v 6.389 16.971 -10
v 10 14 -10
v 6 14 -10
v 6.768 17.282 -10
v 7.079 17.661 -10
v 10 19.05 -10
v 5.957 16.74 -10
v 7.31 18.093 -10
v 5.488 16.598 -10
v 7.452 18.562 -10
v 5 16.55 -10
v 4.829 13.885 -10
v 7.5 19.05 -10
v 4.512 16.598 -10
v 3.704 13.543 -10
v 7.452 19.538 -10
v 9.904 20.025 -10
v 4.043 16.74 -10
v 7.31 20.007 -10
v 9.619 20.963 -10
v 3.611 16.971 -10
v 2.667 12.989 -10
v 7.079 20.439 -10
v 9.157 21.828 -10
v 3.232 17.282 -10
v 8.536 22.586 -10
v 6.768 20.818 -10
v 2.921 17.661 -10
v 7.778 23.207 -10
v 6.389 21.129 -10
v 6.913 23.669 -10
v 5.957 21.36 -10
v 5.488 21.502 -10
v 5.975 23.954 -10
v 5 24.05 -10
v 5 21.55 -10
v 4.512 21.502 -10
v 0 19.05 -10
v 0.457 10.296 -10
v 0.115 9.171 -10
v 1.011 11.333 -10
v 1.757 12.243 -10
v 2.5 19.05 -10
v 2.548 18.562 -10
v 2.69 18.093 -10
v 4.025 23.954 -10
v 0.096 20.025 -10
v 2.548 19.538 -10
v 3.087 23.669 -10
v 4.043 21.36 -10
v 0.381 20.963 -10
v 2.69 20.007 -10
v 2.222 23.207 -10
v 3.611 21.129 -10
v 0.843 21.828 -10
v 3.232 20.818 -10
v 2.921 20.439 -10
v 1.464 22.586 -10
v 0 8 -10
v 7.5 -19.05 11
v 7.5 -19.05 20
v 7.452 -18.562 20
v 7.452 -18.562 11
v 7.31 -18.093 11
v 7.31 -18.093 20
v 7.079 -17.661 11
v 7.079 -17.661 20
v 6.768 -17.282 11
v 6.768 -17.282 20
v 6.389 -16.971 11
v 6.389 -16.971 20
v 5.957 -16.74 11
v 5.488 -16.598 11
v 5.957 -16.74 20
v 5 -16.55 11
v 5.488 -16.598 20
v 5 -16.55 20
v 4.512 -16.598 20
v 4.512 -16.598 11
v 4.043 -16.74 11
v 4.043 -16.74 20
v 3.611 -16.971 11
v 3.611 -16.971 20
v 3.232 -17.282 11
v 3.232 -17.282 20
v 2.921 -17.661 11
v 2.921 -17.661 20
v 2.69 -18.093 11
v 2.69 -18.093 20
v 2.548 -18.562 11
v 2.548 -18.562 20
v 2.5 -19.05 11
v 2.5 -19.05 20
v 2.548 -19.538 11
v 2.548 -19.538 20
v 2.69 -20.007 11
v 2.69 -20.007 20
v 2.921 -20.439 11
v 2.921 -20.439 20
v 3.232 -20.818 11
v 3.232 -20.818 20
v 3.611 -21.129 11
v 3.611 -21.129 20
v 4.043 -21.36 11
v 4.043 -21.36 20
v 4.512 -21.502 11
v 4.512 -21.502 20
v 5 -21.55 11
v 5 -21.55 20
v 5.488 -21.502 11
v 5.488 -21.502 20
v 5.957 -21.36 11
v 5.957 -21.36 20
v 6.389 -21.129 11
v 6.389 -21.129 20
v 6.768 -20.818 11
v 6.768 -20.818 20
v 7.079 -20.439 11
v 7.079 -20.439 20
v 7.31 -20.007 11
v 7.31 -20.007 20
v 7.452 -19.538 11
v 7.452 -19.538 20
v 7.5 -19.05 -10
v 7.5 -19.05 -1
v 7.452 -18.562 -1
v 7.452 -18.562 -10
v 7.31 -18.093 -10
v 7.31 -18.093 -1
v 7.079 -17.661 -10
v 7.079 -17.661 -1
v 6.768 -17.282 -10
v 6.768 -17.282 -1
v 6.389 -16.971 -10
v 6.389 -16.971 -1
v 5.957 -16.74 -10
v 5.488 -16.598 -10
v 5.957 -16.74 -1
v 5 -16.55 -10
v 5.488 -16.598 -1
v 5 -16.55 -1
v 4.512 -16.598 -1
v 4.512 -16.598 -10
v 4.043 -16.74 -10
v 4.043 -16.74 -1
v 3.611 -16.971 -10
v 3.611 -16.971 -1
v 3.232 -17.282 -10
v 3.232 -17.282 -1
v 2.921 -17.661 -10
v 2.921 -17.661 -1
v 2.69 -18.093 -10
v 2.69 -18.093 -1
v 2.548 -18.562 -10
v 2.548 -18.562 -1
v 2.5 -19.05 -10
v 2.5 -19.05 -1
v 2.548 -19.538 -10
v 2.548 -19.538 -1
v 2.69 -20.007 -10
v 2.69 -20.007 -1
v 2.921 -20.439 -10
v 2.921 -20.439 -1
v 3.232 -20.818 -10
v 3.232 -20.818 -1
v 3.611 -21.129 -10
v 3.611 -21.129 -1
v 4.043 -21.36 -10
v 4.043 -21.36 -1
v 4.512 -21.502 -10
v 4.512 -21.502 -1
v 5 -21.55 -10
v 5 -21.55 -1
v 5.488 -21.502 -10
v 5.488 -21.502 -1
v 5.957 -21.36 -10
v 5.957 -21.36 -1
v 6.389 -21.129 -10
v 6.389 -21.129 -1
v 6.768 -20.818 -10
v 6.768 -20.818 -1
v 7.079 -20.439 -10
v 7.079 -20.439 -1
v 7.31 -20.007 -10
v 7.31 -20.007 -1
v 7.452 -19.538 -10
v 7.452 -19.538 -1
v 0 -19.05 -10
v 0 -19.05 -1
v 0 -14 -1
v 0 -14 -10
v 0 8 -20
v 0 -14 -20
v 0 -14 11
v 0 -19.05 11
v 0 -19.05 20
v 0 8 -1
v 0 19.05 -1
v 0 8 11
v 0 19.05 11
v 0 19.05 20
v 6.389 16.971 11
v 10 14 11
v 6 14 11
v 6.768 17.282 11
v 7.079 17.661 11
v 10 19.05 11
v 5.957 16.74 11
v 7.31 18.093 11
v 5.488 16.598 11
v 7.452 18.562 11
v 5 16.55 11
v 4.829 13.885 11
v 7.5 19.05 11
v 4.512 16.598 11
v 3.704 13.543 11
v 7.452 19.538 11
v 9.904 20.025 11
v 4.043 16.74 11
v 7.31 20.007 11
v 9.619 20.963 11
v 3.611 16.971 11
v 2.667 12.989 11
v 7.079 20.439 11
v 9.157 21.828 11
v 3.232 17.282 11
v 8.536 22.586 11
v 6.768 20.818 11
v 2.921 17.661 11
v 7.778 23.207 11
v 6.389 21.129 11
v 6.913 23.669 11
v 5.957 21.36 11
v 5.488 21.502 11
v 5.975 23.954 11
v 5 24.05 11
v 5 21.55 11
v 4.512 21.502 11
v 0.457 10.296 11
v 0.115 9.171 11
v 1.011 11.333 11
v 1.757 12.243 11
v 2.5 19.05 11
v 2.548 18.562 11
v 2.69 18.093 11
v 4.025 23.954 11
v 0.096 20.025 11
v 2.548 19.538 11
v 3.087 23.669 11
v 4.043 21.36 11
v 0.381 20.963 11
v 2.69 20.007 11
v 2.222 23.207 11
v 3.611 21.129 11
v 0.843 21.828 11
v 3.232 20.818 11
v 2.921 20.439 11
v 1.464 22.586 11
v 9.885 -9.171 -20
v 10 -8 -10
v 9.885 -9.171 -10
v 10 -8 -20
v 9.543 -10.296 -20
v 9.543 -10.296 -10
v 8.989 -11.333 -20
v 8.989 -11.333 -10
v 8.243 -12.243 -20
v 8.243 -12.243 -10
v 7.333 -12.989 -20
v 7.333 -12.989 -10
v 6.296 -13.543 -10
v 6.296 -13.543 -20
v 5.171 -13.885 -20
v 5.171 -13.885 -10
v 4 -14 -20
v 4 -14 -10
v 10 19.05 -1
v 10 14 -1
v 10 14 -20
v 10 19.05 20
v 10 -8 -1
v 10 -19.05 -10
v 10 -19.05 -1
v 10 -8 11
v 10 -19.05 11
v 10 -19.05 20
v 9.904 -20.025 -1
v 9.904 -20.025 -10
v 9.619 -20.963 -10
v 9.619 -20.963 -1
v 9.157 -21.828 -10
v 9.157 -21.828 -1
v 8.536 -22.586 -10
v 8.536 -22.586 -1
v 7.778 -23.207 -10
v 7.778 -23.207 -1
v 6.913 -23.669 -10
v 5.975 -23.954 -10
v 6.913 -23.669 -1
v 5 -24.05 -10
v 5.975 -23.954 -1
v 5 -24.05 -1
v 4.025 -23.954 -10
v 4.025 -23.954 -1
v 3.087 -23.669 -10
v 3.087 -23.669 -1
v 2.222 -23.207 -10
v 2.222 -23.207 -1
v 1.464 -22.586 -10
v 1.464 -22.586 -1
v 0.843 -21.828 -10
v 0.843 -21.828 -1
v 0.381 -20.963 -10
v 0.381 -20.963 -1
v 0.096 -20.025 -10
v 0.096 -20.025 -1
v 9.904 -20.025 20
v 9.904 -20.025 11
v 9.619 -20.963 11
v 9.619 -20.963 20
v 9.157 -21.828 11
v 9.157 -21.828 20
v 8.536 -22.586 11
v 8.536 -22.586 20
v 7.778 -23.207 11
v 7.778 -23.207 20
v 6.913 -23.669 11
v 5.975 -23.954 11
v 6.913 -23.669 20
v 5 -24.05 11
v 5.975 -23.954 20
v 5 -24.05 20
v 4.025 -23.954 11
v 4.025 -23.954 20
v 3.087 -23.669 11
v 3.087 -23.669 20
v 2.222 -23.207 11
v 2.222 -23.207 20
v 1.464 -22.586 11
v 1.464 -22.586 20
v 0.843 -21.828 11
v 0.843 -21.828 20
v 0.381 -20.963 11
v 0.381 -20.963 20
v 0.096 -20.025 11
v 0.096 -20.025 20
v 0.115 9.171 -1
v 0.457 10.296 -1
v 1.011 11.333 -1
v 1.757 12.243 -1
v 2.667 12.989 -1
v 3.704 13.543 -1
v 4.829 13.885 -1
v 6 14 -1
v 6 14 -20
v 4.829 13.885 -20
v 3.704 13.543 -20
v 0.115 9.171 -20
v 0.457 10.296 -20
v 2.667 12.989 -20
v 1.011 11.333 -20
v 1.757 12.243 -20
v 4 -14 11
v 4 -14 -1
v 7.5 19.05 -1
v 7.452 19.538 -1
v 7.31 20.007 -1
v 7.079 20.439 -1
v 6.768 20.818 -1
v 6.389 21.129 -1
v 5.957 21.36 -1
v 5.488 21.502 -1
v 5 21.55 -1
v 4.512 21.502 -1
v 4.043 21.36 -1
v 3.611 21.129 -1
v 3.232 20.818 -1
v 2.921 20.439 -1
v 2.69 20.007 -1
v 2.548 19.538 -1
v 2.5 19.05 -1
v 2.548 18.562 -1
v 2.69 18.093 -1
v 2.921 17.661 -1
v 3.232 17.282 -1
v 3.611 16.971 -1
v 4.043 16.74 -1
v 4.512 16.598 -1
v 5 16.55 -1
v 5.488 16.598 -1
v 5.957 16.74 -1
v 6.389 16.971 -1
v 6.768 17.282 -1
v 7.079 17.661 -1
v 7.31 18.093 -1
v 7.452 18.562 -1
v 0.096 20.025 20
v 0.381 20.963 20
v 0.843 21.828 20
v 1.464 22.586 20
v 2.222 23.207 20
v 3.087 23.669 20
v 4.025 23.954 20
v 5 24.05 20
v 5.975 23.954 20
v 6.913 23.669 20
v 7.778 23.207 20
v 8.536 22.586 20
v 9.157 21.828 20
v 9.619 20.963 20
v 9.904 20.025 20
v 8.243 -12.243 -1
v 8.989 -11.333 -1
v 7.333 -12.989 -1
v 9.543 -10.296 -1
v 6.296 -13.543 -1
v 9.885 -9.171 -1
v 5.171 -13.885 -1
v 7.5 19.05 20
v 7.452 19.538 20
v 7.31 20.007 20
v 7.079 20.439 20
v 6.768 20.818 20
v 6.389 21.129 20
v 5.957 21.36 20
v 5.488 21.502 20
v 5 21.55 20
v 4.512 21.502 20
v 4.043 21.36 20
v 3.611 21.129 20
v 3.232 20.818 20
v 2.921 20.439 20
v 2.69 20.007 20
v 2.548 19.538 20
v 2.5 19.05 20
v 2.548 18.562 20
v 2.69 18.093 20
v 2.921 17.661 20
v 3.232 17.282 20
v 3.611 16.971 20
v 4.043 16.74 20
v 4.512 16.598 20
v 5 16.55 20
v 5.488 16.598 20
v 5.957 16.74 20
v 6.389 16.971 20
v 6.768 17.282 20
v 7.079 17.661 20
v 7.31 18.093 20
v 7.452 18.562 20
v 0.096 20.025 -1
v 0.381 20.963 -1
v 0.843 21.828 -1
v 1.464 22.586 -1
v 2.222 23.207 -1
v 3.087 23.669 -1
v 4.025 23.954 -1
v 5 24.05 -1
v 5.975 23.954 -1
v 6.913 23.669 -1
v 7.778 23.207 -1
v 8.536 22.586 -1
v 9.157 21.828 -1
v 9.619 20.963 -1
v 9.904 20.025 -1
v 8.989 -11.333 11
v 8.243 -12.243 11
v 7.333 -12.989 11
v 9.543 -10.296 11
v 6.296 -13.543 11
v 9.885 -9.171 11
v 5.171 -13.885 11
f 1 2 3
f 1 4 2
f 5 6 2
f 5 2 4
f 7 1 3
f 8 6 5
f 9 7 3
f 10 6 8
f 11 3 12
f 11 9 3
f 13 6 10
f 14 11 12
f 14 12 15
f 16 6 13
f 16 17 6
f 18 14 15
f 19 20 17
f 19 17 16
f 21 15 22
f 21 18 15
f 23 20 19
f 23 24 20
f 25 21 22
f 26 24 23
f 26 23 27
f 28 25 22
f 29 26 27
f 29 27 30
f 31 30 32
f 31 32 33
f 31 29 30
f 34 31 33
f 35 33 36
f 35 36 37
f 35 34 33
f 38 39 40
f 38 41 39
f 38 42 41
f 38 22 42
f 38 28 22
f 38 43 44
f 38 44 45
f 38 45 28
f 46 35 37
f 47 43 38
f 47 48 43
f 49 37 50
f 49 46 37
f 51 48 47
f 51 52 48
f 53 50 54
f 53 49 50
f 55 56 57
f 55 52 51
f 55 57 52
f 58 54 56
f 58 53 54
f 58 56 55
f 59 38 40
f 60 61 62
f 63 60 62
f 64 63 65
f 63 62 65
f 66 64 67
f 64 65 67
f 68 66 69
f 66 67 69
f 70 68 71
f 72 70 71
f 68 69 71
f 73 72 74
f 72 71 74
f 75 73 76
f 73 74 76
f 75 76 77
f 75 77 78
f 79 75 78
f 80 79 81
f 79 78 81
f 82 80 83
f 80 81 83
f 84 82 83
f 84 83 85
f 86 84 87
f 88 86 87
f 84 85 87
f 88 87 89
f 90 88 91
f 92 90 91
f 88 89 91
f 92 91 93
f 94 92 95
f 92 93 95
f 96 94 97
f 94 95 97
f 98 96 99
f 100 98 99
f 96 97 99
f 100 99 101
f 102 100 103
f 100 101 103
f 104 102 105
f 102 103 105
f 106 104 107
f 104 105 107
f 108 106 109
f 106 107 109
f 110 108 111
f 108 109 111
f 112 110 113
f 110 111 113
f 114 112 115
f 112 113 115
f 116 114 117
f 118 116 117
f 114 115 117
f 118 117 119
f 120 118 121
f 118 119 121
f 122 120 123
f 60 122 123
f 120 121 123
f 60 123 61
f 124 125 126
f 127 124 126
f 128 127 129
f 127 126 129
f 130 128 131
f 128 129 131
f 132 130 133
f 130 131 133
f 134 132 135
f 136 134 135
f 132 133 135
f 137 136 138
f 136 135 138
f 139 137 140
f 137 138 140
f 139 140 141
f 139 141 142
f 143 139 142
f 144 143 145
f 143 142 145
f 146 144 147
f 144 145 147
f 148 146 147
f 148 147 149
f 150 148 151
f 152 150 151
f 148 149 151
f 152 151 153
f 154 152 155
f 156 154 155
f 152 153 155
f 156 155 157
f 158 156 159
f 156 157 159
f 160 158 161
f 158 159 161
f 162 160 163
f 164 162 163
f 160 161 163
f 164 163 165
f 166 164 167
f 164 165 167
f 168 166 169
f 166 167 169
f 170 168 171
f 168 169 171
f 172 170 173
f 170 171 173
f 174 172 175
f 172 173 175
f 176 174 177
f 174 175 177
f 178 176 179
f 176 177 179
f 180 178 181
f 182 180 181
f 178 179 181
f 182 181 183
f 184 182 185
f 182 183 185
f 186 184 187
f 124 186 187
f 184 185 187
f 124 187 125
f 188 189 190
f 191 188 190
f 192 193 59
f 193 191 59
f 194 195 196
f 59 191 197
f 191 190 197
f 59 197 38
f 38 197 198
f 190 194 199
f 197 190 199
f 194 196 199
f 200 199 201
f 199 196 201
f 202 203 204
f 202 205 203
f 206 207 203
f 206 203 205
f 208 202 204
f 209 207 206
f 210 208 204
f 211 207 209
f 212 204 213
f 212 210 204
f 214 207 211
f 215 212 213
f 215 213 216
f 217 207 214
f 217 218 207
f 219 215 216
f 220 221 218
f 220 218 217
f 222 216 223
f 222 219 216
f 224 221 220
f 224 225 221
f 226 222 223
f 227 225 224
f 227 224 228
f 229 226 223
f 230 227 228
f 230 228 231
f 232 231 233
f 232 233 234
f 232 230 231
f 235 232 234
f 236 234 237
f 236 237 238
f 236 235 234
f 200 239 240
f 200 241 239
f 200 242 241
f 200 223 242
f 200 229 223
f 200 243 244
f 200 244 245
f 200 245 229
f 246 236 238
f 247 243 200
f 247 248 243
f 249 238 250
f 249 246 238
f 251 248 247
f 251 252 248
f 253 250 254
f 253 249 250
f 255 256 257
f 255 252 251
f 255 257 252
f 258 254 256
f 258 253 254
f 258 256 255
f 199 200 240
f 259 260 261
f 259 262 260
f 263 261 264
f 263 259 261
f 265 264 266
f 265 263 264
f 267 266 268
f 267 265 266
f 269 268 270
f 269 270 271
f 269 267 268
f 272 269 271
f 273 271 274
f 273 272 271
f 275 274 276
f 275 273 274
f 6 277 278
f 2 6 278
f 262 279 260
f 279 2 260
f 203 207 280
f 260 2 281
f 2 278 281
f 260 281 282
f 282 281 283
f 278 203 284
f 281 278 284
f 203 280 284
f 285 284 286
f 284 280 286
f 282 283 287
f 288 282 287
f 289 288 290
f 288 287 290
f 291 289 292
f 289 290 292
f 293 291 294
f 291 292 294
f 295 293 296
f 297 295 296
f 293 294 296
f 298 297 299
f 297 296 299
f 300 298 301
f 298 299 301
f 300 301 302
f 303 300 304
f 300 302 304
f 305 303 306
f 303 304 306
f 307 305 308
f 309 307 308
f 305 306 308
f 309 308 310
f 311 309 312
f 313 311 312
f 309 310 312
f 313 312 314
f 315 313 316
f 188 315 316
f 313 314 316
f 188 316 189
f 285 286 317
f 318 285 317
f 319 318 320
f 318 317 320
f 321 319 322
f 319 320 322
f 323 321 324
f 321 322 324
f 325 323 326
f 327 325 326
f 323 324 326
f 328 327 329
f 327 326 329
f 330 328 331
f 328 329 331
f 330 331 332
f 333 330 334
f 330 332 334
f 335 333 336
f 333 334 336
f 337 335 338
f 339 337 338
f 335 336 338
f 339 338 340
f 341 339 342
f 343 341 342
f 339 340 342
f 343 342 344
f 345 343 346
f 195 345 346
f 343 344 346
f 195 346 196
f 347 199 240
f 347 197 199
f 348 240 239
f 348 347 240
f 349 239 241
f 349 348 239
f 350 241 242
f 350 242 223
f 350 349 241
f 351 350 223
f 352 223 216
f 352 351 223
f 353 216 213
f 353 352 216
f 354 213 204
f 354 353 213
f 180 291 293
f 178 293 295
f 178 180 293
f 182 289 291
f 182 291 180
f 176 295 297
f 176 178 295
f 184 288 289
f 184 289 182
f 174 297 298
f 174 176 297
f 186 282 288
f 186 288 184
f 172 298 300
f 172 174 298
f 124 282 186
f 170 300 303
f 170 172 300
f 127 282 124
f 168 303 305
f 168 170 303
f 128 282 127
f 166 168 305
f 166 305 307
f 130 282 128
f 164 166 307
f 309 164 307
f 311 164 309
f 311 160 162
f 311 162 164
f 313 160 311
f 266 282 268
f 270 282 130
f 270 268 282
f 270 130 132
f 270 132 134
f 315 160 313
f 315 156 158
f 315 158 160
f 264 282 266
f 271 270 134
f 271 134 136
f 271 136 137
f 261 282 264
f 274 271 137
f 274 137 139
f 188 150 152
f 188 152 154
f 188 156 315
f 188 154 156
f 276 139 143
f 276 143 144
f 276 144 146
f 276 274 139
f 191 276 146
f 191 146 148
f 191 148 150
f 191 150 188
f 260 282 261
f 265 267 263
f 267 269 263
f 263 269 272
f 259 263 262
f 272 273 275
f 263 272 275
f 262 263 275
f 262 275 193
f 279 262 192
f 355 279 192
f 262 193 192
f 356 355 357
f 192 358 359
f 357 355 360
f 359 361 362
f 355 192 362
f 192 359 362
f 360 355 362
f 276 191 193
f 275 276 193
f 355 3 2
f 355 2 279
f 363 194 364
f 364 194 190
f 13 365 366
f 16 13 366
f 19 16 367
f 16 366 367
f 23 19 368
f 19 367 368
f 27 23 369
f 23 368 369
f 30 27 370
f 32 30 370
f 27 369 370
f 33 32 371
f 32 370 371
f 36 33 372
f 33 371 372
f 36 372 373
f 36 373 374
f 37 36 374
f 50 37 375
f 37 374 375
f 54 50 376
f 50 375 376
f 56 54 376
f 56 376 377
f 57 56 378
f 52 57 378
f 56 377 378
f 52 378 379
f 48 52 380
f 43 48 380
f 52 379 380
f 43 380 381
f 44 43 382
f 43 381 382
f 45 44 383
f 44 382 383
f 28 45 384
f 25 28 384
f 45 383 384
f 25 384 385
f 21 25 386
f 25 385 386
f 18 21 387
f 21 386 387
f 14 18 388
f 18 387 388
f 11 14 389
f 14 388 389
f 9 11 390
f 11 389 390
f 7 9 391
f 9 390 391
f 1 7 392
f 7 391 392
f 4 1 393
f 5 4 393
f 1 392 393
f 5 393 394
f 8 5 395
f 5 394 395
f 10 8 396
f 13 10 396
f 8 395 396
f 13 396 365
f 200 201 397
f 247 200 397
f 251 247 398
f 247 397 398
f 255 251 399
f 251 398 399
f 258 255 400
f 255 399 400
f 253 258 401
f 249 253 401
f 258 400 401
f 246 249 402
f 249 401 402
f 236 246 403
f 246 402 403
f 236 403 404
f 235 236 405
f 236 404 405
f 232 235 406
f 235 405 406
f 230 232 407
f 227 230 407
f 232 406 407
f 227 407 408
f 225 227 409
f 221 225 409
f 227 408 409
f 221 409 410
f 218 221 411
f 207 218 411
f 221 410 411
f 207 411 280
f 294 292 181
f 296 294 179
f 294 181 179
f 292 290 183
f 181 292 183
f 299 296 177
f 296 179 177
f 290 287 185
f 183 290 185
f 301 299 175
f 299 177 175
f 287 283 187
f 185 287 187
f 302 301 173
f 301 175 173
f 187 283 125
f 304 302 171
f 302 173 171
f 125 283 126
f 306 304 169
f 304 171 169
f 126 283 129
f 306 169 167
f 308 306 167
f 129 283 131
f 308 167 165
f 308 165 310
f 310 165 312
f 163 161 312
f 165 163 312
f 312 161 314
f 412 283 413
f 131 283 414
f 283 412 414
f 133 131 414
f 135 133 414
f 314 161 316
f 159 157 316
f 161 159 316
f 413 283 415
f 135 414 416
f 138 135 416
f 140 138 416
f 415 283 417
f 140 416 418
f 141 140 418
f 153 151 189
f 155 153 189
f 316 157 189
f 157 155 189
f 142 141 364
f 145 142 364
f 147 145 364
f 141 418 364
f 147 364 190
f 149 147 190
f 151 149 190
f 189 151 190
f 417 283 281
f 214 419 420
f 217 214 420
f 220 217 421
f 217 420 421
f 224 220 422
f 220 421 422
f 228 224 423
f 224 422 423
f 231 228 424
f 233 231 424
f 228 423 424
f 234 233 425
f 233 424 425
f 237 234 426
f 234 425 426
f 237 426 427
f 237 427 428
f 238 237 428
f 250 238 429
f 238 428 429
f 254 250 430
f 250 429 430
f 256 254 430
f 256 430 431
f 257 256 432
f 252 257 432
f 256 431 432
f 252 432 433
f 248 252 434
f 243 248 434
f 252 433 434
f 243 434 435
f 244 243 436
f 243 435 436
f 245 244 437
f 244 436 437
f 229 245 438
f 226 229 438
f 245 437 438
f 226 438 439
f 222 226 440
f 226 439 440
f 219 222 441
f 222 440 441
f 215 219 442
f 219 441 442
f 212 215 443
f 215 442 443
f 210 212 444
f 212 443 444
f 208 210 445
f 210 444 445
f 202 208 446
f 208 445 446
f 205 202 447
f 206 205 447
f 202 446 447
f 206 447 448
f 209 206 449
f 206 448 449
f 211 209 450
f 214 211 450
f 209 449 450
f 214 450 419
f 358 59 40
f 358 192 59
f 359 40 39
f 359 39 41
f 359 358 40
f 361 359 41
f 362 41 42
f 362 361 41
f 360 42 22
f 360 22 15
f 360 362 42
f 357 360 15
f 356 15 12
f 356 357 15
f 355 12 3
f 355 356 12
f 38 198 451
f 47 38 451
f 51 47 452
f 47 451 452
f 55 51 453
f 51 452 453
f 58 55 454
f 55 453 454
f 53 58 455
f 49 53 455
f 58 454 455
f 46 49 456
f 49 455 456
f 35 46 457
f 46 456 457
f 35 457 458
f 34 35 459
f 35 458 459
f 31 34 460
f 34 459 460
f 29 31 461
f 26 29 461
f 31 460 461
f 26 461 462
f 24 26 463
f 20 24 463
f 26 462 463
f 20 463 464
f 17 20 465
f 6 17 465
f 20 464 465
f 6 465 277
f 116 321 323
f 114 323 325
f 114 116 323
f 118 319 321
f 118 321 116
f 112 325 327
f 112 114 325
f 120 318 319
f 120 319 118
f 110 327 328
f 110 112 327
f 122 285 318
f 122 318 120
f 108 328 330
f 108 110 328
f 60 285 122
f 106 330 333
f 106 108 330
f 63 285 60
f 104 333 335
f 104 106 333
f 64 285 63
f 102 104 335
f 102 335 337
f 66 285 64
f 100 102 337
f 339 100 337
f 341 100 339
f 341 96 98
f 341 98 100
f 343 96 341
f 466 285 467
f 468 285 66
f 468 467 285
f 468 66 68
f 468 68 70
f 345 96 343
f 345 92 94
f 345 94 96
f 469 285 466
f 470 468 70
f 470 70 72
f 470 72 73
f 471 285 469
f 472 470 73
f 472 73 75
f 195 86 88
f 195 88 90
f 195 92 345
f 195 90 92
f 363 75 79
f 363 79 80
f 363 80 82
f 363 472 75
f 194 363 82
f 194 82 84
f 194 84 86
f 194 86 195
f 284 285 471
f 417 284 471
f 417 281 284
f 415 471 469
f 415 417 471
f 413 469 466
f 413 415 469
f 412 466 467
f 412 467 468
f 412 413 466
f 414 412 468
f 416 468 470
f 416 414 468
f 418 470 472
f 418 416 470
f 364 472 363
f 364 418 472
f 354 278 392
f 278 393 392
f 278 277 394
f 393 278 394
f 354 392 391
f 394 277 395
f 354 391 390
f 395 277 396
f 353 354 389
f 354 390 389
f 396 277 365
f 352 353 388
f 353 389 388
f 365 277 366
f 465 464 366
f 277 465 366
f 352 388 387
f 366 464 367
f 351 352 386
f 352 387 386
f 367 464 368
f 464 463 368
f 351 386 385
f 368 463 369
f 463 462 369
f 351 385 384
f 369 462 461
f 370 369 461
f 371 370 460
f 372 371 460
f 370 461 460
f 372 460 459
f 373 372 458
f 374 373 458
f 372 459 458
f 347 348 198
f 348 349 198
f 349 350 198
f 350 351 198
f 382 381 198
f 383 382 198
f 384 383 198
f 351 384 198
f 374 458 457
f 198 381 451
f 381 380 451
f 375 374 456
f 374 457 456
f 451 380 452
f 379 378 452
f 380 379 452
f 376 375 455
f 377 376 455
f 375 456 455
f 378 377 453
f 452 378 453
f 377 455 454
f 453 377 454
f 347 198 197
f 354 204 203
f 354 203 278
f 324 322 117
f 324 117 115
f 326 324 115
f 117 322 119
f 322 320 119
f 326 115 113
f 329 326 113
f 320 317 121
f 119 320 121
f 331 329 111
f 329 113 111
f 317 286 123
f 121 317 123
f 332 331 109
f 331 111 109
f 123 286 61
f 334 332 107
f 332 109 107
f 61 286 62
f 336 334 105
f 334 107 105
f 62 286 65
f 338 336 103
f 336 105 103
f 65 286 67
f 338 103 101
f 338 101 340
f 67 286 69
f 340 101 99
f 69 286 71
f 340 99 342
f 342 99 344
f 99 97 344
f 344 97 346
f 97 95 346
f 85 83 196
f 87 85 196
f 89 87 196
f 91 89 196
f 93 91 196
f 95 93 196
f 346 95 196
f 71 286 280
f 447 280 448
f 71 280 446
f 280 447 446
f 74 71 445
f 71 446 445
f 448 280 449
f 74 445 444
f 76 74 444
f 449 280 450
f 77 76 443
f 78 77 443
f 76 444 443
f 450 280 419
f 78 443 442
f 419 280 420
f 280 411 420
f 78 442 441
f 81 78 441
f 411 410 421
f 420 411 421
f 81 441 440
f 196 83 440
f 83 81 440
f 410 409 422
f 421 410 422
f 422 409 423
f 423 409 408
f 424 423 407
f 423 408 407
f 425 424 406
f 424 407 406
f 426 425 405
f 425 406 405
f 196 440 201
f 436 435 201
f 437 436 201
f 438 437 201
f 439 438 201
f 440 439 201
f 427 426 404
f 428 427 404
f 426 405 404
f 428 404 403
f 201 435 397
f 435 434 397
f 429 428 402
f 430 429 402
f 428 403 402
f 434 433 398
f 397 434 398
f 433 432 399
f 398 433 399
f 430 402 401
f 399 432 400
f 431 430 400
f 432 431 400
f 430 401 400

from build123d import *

# Parameters (mm, degrees)
SKETCH1_W           = 40
SKETCH1_H           = 28
BOSS_EXTRUDE1_DEPTH = 10
SKETCH2_R           = 2.5
BOSS_EXTRUDE2_DEPTH = 9
LPATTERN1_COUNT     = 2
LPATTERN1_PITCH     = 21
FILLET1_R           = 6


with BuildPart() as part:
    # Sketch1 → Boss-Extrude1 (new body)
    with BuildSketch(Plane(origin=(0, 0, 0), x_dir=(0, 0, -1), z_dir=(1, 0, 0))):
        Rectangle(SKETCH1_W, SKETCH1_H)
    extrude(amount=BOSS_EXTRUDE1_DEPTH)

    # Sketch2 → Boss-Extrude2 (add)
    with BuildSketch(Plane.XY.offset(20)):
        with BuildLine():
            Line((10, 19.05), (10, -19.05))
            ThreePointArc((10, -19.05), (5, -24.05), (0, -19.05))
            Line((0, -19.05), (0, 19.05))
            ThreePointArc((0, 19.05), (5, 24.05), (10, 19.05))
        make_face()
        with Locations((5, 19.05)):
            Circle(SKETCH2_R, mode=Mode.SUBTRACT)
        with Locations((5, -19.05)):
            Circle(SKETCH2_R, mode=Mode.SUBTRACT)
    boss_extrude2 = extrude(amount=-BOSS_EXTRUDE2_DEPTH)

    # LPattern1: Boss-Extrude2 ×2
    with Locations(*[(0, 0, -i * LPATTERN1_PITCH) for i in range(1, LPATTERN1_COUNT)]):
        add(boss_extrude2)

    # Fillet1
    fillet1_edges = [part.edges().sort_by_distance(p)[0] for p in [
        (10, -14, 5),
        (0, 14, 5),
        (10, -14, -15),
        (0, 14, -15),
    ]]
    fillet(fillet1_edges, radius=FILLET1_R)


solid = part.part
